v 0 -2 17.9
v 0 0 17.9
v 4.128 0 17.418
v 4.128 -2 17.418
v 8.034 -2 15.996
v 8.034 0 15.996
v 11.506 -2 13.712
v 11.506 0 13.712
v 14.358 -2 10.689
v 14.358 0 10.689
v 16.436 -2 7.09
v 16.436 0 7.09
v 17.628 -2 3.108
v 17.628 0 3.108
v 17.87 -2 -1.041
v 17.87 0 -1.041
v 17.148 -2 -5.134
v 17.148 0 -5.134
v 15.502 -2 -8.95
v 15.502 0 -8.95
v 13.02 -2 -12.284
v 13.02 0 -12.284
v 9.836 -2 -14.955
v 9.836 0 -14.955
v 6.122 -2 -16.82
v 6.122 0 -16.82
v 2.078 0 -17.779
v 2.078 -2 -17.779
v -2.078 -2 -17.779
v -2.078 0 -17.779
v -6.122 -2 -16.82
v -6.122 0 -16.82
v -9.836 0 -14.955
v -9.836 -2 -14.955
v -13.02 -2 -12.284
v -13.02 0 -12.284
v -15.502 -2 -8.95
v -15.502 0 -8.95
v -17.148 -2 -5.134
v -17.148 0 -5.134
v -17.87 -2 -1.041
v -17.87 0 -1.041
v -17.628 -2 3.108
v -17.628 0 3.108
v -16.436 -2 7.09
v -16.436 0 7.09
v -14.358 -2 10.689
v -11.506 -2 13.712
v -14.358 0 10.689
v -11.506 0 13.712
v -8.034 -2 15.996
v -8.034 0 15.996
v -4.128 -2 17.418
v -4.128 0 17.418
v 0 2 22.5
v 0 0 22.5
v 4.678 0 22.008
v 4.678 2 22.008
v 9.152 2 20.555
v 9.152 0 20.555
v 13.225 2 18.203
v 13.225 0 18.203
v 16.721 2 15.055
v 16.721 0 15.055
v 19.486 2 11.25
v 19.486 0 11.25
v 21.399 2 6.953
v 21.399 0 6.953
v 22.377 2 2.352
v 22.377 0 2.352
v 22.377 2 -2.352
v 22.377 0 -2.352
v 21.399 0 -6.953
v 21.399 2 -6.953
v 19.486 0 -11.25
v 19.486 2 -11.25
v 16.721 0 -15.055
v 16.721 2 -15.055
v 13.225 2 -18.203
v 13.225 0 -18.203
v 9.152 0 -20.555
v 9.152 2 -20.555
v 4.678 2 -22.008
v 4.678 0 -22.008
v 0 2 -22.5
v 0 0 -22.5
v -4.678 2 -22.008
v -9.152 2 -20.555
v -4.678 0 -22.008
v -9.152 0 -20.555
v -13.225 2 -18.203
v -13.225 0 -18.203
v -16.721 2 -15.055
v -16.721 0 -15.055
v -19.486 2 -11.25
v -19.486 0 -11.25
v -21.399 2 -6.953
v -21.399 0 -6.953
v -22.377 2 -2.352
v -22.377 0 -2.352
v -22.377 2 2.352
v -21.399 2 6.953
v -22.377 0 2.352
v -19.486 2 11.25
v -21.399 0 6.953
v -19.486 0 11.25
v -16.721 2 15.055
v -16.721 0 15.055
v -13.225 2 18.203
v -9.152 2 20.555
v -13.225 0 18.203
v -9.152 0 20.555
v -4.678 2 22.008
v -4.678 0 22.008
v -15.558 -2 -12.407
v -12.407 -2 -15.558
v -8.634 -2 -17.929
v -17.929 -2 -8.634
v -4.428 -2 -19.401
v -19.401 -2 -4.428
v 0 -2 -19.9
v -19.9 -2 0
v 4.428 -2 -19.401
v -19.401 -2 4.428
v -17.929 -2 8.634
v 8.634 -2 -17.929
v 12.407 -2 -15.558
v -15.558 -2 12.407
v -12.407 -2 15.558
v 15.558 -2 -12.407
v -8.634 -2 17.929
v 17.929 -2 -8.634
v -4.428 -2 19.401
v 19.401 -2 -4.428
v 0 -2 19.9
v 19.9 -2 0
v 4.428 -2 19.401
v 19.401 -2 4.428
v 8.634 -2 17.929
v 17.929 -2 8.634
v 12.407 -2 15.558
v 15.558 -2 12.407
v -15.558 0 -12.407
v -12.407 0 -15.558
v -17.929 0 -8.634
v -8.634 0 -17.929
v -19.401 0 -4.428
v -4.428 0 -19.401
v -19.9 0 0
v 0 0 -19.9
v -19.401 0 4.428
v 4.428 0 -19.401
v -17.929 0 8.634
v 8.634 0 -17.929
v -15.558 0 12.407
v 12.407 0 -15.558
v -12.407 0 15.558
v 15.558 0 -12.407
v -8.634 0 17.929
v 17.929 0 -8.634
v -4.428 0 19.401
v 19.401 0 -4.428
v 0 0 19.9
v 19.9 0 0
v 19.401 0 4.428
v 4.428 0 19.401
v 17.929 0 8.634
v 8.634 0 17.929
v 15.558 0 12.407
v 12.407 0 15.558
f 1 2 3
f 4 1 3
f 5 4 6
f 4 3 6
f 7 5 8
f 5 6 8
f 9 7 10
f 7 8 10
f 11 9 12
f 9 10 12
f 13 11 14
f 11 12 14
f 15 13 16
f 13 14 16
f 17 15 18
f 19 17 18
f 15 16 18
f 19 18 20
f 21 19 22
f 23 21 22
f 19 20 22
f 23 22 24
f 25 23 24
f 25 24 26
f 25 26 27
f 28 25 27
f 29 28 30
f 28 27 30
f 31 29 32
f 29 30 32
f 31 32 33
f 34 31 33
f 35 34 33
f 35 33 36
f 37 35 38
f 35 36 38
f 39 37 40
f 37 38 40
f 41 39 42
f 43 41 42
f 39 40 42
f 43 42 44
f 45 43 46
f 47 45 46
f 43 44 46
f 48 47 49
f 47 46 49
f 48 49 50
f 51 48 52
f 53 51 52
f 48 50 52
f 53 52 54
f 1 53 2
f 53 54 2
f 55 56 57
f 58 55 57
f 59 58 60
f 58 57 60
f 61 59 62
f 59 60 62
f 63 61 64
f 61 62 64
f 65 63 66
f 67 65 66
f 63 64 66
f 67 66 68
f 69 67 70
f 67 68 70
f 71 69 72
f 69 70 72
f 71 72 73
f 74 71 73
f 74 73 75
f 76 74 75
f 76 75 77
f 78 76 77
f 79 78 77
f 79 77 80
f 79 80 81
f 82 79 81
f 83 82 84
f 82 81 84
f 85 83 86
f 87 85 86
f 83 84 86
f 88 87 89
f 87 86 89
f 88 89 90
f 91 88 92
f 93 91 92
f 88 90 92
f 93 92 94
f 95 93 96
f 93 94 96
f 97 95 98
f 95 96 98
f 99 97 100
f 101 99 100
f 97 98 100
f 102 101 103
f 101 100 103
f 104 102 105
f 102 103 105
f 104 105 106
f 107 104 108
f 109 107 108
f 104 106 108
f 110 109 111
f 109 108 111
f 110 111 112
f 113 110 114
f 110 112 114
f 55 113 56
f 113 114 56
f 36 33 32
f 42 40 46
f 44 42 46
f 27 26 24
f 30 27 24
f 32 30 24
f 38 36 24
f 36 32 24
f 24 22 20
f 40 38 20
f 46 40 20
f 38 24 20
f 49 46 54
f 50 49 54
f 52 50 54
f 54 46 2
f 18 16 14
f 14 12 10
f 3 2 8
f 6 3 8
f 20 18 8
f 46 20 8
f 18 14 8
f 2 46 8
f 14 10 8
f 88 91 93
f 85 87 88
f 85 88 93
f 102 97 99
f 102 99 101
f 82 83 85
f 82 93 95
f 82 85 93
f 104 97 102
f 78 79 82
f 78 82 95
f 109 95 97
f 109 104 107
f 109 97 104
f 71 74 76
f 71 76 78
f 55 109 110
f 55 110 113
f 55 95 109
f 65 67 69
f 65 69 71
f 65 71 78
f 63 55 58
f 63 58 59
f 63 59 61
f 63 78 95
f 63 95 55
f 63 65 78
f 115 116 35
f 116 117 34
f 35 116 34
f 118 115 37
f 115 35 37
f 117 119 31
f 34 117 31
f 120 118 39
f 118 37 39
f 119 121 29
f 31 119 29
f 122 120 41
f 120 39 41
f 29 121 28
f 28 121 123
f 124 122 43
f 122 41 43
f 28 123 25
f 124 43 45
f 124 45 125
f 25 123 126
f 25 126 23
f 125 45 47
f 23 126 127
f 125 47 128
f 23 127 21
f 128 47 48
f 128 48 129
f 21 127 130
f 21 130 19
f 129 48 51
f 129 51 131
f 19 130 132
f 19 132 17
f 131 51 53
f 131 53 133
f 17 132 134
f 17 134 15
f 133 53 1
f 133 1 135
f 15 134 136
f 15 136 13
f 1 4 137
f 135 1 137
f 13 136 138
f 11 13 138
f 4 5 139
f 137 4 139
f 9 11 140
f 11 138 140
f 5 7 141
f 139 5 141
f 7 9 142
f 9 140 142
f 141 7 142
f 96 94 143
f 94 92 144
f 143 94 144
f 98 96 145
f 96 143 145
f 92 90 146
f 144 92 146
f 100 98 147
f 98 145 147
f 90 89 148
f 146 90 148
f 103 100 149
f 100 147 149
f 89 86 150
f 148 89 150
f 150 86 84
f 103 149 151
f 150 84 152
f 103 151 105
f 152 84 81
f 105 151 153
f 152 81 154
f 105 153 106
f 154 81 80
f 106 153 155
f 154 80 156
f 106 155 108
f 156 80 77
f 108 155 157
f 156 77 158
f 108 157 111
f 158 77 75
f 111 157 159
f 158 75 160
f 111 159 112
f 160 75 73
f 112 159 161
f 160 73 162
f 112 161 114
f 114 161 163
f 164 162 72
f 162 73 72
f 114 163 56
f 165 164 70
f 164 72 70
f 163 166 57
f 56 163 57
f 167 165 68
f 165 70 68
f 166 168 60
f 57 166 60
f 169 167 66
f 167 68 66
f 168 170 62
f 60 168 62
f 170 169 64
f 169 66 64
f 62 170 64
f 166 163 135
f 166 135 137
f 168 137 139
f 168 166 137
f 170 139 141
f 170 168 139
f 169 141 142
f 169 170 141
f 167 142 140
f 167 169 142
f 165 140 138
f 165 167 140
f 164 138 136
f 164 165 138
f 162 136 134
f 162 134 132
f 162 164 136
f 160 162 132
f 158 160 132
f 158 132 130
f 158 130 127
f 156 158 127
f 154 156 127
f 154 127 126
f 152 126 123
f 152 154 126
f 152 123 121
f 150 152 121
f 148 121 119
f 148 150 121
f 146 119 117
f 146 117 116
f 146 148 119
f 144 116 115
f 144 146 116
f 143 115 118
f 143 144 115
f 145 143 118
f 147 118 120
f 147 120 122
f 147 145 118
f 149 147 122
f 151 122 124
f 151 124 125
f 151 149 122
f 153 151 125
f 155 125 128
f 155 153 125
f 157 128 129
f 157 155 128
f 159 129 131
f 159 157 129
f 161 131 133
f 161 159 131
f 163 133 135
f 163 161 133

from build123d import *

# Parameters (mm, degrees)
SKIZZE1_R                       = 22.5
AUFSATZ_LINEAR_AUSTRAGEN1_DEPTH = 2
SKIZZE2_R                       = 19.9
SKIZZE2_R_2                     = 17.9
AUFSATZ_LINEAR_AUSTRAGEN2_DEPTH = 2


with BuildPart() as part:
    # Skizze1 → Aufsatz-Linear austragen1 (new body)
    with BuildSketch(Plane(origin=(0, 0, 0), x_dir=(1, 0, 0), z_dir=(0, 1, 0))):
        with Locations(Location((0, 0, 0), (0, 0, 270))):
            Circle(SKIZZE1_R)
    extrude(amount=AUFSATZ_LINEAR_AUSTRAGEN1_DEPTH)

    # Skizze2 → Aufsatz-Linear austragen2 (add)
    with BuildSketch(Plane(origin=(0, 0, 0), x_dir=(1, 0, 0), z_dir=(0, 1, 0))):
        with Locations(Location((0, 0, 0), (0, 0, 270))):
            Circle(SKIZZE2_R)
        with Locations(Location((0, 0, 0), (0, 0, 270))):
            Circle(SKIZZE2_R_2, mode=Mode.SUBTRACT)
    extrude(amount=-AUFSATZ_LINEAR_AUSTRAGEN2_DEPTH)


solid = part.part
